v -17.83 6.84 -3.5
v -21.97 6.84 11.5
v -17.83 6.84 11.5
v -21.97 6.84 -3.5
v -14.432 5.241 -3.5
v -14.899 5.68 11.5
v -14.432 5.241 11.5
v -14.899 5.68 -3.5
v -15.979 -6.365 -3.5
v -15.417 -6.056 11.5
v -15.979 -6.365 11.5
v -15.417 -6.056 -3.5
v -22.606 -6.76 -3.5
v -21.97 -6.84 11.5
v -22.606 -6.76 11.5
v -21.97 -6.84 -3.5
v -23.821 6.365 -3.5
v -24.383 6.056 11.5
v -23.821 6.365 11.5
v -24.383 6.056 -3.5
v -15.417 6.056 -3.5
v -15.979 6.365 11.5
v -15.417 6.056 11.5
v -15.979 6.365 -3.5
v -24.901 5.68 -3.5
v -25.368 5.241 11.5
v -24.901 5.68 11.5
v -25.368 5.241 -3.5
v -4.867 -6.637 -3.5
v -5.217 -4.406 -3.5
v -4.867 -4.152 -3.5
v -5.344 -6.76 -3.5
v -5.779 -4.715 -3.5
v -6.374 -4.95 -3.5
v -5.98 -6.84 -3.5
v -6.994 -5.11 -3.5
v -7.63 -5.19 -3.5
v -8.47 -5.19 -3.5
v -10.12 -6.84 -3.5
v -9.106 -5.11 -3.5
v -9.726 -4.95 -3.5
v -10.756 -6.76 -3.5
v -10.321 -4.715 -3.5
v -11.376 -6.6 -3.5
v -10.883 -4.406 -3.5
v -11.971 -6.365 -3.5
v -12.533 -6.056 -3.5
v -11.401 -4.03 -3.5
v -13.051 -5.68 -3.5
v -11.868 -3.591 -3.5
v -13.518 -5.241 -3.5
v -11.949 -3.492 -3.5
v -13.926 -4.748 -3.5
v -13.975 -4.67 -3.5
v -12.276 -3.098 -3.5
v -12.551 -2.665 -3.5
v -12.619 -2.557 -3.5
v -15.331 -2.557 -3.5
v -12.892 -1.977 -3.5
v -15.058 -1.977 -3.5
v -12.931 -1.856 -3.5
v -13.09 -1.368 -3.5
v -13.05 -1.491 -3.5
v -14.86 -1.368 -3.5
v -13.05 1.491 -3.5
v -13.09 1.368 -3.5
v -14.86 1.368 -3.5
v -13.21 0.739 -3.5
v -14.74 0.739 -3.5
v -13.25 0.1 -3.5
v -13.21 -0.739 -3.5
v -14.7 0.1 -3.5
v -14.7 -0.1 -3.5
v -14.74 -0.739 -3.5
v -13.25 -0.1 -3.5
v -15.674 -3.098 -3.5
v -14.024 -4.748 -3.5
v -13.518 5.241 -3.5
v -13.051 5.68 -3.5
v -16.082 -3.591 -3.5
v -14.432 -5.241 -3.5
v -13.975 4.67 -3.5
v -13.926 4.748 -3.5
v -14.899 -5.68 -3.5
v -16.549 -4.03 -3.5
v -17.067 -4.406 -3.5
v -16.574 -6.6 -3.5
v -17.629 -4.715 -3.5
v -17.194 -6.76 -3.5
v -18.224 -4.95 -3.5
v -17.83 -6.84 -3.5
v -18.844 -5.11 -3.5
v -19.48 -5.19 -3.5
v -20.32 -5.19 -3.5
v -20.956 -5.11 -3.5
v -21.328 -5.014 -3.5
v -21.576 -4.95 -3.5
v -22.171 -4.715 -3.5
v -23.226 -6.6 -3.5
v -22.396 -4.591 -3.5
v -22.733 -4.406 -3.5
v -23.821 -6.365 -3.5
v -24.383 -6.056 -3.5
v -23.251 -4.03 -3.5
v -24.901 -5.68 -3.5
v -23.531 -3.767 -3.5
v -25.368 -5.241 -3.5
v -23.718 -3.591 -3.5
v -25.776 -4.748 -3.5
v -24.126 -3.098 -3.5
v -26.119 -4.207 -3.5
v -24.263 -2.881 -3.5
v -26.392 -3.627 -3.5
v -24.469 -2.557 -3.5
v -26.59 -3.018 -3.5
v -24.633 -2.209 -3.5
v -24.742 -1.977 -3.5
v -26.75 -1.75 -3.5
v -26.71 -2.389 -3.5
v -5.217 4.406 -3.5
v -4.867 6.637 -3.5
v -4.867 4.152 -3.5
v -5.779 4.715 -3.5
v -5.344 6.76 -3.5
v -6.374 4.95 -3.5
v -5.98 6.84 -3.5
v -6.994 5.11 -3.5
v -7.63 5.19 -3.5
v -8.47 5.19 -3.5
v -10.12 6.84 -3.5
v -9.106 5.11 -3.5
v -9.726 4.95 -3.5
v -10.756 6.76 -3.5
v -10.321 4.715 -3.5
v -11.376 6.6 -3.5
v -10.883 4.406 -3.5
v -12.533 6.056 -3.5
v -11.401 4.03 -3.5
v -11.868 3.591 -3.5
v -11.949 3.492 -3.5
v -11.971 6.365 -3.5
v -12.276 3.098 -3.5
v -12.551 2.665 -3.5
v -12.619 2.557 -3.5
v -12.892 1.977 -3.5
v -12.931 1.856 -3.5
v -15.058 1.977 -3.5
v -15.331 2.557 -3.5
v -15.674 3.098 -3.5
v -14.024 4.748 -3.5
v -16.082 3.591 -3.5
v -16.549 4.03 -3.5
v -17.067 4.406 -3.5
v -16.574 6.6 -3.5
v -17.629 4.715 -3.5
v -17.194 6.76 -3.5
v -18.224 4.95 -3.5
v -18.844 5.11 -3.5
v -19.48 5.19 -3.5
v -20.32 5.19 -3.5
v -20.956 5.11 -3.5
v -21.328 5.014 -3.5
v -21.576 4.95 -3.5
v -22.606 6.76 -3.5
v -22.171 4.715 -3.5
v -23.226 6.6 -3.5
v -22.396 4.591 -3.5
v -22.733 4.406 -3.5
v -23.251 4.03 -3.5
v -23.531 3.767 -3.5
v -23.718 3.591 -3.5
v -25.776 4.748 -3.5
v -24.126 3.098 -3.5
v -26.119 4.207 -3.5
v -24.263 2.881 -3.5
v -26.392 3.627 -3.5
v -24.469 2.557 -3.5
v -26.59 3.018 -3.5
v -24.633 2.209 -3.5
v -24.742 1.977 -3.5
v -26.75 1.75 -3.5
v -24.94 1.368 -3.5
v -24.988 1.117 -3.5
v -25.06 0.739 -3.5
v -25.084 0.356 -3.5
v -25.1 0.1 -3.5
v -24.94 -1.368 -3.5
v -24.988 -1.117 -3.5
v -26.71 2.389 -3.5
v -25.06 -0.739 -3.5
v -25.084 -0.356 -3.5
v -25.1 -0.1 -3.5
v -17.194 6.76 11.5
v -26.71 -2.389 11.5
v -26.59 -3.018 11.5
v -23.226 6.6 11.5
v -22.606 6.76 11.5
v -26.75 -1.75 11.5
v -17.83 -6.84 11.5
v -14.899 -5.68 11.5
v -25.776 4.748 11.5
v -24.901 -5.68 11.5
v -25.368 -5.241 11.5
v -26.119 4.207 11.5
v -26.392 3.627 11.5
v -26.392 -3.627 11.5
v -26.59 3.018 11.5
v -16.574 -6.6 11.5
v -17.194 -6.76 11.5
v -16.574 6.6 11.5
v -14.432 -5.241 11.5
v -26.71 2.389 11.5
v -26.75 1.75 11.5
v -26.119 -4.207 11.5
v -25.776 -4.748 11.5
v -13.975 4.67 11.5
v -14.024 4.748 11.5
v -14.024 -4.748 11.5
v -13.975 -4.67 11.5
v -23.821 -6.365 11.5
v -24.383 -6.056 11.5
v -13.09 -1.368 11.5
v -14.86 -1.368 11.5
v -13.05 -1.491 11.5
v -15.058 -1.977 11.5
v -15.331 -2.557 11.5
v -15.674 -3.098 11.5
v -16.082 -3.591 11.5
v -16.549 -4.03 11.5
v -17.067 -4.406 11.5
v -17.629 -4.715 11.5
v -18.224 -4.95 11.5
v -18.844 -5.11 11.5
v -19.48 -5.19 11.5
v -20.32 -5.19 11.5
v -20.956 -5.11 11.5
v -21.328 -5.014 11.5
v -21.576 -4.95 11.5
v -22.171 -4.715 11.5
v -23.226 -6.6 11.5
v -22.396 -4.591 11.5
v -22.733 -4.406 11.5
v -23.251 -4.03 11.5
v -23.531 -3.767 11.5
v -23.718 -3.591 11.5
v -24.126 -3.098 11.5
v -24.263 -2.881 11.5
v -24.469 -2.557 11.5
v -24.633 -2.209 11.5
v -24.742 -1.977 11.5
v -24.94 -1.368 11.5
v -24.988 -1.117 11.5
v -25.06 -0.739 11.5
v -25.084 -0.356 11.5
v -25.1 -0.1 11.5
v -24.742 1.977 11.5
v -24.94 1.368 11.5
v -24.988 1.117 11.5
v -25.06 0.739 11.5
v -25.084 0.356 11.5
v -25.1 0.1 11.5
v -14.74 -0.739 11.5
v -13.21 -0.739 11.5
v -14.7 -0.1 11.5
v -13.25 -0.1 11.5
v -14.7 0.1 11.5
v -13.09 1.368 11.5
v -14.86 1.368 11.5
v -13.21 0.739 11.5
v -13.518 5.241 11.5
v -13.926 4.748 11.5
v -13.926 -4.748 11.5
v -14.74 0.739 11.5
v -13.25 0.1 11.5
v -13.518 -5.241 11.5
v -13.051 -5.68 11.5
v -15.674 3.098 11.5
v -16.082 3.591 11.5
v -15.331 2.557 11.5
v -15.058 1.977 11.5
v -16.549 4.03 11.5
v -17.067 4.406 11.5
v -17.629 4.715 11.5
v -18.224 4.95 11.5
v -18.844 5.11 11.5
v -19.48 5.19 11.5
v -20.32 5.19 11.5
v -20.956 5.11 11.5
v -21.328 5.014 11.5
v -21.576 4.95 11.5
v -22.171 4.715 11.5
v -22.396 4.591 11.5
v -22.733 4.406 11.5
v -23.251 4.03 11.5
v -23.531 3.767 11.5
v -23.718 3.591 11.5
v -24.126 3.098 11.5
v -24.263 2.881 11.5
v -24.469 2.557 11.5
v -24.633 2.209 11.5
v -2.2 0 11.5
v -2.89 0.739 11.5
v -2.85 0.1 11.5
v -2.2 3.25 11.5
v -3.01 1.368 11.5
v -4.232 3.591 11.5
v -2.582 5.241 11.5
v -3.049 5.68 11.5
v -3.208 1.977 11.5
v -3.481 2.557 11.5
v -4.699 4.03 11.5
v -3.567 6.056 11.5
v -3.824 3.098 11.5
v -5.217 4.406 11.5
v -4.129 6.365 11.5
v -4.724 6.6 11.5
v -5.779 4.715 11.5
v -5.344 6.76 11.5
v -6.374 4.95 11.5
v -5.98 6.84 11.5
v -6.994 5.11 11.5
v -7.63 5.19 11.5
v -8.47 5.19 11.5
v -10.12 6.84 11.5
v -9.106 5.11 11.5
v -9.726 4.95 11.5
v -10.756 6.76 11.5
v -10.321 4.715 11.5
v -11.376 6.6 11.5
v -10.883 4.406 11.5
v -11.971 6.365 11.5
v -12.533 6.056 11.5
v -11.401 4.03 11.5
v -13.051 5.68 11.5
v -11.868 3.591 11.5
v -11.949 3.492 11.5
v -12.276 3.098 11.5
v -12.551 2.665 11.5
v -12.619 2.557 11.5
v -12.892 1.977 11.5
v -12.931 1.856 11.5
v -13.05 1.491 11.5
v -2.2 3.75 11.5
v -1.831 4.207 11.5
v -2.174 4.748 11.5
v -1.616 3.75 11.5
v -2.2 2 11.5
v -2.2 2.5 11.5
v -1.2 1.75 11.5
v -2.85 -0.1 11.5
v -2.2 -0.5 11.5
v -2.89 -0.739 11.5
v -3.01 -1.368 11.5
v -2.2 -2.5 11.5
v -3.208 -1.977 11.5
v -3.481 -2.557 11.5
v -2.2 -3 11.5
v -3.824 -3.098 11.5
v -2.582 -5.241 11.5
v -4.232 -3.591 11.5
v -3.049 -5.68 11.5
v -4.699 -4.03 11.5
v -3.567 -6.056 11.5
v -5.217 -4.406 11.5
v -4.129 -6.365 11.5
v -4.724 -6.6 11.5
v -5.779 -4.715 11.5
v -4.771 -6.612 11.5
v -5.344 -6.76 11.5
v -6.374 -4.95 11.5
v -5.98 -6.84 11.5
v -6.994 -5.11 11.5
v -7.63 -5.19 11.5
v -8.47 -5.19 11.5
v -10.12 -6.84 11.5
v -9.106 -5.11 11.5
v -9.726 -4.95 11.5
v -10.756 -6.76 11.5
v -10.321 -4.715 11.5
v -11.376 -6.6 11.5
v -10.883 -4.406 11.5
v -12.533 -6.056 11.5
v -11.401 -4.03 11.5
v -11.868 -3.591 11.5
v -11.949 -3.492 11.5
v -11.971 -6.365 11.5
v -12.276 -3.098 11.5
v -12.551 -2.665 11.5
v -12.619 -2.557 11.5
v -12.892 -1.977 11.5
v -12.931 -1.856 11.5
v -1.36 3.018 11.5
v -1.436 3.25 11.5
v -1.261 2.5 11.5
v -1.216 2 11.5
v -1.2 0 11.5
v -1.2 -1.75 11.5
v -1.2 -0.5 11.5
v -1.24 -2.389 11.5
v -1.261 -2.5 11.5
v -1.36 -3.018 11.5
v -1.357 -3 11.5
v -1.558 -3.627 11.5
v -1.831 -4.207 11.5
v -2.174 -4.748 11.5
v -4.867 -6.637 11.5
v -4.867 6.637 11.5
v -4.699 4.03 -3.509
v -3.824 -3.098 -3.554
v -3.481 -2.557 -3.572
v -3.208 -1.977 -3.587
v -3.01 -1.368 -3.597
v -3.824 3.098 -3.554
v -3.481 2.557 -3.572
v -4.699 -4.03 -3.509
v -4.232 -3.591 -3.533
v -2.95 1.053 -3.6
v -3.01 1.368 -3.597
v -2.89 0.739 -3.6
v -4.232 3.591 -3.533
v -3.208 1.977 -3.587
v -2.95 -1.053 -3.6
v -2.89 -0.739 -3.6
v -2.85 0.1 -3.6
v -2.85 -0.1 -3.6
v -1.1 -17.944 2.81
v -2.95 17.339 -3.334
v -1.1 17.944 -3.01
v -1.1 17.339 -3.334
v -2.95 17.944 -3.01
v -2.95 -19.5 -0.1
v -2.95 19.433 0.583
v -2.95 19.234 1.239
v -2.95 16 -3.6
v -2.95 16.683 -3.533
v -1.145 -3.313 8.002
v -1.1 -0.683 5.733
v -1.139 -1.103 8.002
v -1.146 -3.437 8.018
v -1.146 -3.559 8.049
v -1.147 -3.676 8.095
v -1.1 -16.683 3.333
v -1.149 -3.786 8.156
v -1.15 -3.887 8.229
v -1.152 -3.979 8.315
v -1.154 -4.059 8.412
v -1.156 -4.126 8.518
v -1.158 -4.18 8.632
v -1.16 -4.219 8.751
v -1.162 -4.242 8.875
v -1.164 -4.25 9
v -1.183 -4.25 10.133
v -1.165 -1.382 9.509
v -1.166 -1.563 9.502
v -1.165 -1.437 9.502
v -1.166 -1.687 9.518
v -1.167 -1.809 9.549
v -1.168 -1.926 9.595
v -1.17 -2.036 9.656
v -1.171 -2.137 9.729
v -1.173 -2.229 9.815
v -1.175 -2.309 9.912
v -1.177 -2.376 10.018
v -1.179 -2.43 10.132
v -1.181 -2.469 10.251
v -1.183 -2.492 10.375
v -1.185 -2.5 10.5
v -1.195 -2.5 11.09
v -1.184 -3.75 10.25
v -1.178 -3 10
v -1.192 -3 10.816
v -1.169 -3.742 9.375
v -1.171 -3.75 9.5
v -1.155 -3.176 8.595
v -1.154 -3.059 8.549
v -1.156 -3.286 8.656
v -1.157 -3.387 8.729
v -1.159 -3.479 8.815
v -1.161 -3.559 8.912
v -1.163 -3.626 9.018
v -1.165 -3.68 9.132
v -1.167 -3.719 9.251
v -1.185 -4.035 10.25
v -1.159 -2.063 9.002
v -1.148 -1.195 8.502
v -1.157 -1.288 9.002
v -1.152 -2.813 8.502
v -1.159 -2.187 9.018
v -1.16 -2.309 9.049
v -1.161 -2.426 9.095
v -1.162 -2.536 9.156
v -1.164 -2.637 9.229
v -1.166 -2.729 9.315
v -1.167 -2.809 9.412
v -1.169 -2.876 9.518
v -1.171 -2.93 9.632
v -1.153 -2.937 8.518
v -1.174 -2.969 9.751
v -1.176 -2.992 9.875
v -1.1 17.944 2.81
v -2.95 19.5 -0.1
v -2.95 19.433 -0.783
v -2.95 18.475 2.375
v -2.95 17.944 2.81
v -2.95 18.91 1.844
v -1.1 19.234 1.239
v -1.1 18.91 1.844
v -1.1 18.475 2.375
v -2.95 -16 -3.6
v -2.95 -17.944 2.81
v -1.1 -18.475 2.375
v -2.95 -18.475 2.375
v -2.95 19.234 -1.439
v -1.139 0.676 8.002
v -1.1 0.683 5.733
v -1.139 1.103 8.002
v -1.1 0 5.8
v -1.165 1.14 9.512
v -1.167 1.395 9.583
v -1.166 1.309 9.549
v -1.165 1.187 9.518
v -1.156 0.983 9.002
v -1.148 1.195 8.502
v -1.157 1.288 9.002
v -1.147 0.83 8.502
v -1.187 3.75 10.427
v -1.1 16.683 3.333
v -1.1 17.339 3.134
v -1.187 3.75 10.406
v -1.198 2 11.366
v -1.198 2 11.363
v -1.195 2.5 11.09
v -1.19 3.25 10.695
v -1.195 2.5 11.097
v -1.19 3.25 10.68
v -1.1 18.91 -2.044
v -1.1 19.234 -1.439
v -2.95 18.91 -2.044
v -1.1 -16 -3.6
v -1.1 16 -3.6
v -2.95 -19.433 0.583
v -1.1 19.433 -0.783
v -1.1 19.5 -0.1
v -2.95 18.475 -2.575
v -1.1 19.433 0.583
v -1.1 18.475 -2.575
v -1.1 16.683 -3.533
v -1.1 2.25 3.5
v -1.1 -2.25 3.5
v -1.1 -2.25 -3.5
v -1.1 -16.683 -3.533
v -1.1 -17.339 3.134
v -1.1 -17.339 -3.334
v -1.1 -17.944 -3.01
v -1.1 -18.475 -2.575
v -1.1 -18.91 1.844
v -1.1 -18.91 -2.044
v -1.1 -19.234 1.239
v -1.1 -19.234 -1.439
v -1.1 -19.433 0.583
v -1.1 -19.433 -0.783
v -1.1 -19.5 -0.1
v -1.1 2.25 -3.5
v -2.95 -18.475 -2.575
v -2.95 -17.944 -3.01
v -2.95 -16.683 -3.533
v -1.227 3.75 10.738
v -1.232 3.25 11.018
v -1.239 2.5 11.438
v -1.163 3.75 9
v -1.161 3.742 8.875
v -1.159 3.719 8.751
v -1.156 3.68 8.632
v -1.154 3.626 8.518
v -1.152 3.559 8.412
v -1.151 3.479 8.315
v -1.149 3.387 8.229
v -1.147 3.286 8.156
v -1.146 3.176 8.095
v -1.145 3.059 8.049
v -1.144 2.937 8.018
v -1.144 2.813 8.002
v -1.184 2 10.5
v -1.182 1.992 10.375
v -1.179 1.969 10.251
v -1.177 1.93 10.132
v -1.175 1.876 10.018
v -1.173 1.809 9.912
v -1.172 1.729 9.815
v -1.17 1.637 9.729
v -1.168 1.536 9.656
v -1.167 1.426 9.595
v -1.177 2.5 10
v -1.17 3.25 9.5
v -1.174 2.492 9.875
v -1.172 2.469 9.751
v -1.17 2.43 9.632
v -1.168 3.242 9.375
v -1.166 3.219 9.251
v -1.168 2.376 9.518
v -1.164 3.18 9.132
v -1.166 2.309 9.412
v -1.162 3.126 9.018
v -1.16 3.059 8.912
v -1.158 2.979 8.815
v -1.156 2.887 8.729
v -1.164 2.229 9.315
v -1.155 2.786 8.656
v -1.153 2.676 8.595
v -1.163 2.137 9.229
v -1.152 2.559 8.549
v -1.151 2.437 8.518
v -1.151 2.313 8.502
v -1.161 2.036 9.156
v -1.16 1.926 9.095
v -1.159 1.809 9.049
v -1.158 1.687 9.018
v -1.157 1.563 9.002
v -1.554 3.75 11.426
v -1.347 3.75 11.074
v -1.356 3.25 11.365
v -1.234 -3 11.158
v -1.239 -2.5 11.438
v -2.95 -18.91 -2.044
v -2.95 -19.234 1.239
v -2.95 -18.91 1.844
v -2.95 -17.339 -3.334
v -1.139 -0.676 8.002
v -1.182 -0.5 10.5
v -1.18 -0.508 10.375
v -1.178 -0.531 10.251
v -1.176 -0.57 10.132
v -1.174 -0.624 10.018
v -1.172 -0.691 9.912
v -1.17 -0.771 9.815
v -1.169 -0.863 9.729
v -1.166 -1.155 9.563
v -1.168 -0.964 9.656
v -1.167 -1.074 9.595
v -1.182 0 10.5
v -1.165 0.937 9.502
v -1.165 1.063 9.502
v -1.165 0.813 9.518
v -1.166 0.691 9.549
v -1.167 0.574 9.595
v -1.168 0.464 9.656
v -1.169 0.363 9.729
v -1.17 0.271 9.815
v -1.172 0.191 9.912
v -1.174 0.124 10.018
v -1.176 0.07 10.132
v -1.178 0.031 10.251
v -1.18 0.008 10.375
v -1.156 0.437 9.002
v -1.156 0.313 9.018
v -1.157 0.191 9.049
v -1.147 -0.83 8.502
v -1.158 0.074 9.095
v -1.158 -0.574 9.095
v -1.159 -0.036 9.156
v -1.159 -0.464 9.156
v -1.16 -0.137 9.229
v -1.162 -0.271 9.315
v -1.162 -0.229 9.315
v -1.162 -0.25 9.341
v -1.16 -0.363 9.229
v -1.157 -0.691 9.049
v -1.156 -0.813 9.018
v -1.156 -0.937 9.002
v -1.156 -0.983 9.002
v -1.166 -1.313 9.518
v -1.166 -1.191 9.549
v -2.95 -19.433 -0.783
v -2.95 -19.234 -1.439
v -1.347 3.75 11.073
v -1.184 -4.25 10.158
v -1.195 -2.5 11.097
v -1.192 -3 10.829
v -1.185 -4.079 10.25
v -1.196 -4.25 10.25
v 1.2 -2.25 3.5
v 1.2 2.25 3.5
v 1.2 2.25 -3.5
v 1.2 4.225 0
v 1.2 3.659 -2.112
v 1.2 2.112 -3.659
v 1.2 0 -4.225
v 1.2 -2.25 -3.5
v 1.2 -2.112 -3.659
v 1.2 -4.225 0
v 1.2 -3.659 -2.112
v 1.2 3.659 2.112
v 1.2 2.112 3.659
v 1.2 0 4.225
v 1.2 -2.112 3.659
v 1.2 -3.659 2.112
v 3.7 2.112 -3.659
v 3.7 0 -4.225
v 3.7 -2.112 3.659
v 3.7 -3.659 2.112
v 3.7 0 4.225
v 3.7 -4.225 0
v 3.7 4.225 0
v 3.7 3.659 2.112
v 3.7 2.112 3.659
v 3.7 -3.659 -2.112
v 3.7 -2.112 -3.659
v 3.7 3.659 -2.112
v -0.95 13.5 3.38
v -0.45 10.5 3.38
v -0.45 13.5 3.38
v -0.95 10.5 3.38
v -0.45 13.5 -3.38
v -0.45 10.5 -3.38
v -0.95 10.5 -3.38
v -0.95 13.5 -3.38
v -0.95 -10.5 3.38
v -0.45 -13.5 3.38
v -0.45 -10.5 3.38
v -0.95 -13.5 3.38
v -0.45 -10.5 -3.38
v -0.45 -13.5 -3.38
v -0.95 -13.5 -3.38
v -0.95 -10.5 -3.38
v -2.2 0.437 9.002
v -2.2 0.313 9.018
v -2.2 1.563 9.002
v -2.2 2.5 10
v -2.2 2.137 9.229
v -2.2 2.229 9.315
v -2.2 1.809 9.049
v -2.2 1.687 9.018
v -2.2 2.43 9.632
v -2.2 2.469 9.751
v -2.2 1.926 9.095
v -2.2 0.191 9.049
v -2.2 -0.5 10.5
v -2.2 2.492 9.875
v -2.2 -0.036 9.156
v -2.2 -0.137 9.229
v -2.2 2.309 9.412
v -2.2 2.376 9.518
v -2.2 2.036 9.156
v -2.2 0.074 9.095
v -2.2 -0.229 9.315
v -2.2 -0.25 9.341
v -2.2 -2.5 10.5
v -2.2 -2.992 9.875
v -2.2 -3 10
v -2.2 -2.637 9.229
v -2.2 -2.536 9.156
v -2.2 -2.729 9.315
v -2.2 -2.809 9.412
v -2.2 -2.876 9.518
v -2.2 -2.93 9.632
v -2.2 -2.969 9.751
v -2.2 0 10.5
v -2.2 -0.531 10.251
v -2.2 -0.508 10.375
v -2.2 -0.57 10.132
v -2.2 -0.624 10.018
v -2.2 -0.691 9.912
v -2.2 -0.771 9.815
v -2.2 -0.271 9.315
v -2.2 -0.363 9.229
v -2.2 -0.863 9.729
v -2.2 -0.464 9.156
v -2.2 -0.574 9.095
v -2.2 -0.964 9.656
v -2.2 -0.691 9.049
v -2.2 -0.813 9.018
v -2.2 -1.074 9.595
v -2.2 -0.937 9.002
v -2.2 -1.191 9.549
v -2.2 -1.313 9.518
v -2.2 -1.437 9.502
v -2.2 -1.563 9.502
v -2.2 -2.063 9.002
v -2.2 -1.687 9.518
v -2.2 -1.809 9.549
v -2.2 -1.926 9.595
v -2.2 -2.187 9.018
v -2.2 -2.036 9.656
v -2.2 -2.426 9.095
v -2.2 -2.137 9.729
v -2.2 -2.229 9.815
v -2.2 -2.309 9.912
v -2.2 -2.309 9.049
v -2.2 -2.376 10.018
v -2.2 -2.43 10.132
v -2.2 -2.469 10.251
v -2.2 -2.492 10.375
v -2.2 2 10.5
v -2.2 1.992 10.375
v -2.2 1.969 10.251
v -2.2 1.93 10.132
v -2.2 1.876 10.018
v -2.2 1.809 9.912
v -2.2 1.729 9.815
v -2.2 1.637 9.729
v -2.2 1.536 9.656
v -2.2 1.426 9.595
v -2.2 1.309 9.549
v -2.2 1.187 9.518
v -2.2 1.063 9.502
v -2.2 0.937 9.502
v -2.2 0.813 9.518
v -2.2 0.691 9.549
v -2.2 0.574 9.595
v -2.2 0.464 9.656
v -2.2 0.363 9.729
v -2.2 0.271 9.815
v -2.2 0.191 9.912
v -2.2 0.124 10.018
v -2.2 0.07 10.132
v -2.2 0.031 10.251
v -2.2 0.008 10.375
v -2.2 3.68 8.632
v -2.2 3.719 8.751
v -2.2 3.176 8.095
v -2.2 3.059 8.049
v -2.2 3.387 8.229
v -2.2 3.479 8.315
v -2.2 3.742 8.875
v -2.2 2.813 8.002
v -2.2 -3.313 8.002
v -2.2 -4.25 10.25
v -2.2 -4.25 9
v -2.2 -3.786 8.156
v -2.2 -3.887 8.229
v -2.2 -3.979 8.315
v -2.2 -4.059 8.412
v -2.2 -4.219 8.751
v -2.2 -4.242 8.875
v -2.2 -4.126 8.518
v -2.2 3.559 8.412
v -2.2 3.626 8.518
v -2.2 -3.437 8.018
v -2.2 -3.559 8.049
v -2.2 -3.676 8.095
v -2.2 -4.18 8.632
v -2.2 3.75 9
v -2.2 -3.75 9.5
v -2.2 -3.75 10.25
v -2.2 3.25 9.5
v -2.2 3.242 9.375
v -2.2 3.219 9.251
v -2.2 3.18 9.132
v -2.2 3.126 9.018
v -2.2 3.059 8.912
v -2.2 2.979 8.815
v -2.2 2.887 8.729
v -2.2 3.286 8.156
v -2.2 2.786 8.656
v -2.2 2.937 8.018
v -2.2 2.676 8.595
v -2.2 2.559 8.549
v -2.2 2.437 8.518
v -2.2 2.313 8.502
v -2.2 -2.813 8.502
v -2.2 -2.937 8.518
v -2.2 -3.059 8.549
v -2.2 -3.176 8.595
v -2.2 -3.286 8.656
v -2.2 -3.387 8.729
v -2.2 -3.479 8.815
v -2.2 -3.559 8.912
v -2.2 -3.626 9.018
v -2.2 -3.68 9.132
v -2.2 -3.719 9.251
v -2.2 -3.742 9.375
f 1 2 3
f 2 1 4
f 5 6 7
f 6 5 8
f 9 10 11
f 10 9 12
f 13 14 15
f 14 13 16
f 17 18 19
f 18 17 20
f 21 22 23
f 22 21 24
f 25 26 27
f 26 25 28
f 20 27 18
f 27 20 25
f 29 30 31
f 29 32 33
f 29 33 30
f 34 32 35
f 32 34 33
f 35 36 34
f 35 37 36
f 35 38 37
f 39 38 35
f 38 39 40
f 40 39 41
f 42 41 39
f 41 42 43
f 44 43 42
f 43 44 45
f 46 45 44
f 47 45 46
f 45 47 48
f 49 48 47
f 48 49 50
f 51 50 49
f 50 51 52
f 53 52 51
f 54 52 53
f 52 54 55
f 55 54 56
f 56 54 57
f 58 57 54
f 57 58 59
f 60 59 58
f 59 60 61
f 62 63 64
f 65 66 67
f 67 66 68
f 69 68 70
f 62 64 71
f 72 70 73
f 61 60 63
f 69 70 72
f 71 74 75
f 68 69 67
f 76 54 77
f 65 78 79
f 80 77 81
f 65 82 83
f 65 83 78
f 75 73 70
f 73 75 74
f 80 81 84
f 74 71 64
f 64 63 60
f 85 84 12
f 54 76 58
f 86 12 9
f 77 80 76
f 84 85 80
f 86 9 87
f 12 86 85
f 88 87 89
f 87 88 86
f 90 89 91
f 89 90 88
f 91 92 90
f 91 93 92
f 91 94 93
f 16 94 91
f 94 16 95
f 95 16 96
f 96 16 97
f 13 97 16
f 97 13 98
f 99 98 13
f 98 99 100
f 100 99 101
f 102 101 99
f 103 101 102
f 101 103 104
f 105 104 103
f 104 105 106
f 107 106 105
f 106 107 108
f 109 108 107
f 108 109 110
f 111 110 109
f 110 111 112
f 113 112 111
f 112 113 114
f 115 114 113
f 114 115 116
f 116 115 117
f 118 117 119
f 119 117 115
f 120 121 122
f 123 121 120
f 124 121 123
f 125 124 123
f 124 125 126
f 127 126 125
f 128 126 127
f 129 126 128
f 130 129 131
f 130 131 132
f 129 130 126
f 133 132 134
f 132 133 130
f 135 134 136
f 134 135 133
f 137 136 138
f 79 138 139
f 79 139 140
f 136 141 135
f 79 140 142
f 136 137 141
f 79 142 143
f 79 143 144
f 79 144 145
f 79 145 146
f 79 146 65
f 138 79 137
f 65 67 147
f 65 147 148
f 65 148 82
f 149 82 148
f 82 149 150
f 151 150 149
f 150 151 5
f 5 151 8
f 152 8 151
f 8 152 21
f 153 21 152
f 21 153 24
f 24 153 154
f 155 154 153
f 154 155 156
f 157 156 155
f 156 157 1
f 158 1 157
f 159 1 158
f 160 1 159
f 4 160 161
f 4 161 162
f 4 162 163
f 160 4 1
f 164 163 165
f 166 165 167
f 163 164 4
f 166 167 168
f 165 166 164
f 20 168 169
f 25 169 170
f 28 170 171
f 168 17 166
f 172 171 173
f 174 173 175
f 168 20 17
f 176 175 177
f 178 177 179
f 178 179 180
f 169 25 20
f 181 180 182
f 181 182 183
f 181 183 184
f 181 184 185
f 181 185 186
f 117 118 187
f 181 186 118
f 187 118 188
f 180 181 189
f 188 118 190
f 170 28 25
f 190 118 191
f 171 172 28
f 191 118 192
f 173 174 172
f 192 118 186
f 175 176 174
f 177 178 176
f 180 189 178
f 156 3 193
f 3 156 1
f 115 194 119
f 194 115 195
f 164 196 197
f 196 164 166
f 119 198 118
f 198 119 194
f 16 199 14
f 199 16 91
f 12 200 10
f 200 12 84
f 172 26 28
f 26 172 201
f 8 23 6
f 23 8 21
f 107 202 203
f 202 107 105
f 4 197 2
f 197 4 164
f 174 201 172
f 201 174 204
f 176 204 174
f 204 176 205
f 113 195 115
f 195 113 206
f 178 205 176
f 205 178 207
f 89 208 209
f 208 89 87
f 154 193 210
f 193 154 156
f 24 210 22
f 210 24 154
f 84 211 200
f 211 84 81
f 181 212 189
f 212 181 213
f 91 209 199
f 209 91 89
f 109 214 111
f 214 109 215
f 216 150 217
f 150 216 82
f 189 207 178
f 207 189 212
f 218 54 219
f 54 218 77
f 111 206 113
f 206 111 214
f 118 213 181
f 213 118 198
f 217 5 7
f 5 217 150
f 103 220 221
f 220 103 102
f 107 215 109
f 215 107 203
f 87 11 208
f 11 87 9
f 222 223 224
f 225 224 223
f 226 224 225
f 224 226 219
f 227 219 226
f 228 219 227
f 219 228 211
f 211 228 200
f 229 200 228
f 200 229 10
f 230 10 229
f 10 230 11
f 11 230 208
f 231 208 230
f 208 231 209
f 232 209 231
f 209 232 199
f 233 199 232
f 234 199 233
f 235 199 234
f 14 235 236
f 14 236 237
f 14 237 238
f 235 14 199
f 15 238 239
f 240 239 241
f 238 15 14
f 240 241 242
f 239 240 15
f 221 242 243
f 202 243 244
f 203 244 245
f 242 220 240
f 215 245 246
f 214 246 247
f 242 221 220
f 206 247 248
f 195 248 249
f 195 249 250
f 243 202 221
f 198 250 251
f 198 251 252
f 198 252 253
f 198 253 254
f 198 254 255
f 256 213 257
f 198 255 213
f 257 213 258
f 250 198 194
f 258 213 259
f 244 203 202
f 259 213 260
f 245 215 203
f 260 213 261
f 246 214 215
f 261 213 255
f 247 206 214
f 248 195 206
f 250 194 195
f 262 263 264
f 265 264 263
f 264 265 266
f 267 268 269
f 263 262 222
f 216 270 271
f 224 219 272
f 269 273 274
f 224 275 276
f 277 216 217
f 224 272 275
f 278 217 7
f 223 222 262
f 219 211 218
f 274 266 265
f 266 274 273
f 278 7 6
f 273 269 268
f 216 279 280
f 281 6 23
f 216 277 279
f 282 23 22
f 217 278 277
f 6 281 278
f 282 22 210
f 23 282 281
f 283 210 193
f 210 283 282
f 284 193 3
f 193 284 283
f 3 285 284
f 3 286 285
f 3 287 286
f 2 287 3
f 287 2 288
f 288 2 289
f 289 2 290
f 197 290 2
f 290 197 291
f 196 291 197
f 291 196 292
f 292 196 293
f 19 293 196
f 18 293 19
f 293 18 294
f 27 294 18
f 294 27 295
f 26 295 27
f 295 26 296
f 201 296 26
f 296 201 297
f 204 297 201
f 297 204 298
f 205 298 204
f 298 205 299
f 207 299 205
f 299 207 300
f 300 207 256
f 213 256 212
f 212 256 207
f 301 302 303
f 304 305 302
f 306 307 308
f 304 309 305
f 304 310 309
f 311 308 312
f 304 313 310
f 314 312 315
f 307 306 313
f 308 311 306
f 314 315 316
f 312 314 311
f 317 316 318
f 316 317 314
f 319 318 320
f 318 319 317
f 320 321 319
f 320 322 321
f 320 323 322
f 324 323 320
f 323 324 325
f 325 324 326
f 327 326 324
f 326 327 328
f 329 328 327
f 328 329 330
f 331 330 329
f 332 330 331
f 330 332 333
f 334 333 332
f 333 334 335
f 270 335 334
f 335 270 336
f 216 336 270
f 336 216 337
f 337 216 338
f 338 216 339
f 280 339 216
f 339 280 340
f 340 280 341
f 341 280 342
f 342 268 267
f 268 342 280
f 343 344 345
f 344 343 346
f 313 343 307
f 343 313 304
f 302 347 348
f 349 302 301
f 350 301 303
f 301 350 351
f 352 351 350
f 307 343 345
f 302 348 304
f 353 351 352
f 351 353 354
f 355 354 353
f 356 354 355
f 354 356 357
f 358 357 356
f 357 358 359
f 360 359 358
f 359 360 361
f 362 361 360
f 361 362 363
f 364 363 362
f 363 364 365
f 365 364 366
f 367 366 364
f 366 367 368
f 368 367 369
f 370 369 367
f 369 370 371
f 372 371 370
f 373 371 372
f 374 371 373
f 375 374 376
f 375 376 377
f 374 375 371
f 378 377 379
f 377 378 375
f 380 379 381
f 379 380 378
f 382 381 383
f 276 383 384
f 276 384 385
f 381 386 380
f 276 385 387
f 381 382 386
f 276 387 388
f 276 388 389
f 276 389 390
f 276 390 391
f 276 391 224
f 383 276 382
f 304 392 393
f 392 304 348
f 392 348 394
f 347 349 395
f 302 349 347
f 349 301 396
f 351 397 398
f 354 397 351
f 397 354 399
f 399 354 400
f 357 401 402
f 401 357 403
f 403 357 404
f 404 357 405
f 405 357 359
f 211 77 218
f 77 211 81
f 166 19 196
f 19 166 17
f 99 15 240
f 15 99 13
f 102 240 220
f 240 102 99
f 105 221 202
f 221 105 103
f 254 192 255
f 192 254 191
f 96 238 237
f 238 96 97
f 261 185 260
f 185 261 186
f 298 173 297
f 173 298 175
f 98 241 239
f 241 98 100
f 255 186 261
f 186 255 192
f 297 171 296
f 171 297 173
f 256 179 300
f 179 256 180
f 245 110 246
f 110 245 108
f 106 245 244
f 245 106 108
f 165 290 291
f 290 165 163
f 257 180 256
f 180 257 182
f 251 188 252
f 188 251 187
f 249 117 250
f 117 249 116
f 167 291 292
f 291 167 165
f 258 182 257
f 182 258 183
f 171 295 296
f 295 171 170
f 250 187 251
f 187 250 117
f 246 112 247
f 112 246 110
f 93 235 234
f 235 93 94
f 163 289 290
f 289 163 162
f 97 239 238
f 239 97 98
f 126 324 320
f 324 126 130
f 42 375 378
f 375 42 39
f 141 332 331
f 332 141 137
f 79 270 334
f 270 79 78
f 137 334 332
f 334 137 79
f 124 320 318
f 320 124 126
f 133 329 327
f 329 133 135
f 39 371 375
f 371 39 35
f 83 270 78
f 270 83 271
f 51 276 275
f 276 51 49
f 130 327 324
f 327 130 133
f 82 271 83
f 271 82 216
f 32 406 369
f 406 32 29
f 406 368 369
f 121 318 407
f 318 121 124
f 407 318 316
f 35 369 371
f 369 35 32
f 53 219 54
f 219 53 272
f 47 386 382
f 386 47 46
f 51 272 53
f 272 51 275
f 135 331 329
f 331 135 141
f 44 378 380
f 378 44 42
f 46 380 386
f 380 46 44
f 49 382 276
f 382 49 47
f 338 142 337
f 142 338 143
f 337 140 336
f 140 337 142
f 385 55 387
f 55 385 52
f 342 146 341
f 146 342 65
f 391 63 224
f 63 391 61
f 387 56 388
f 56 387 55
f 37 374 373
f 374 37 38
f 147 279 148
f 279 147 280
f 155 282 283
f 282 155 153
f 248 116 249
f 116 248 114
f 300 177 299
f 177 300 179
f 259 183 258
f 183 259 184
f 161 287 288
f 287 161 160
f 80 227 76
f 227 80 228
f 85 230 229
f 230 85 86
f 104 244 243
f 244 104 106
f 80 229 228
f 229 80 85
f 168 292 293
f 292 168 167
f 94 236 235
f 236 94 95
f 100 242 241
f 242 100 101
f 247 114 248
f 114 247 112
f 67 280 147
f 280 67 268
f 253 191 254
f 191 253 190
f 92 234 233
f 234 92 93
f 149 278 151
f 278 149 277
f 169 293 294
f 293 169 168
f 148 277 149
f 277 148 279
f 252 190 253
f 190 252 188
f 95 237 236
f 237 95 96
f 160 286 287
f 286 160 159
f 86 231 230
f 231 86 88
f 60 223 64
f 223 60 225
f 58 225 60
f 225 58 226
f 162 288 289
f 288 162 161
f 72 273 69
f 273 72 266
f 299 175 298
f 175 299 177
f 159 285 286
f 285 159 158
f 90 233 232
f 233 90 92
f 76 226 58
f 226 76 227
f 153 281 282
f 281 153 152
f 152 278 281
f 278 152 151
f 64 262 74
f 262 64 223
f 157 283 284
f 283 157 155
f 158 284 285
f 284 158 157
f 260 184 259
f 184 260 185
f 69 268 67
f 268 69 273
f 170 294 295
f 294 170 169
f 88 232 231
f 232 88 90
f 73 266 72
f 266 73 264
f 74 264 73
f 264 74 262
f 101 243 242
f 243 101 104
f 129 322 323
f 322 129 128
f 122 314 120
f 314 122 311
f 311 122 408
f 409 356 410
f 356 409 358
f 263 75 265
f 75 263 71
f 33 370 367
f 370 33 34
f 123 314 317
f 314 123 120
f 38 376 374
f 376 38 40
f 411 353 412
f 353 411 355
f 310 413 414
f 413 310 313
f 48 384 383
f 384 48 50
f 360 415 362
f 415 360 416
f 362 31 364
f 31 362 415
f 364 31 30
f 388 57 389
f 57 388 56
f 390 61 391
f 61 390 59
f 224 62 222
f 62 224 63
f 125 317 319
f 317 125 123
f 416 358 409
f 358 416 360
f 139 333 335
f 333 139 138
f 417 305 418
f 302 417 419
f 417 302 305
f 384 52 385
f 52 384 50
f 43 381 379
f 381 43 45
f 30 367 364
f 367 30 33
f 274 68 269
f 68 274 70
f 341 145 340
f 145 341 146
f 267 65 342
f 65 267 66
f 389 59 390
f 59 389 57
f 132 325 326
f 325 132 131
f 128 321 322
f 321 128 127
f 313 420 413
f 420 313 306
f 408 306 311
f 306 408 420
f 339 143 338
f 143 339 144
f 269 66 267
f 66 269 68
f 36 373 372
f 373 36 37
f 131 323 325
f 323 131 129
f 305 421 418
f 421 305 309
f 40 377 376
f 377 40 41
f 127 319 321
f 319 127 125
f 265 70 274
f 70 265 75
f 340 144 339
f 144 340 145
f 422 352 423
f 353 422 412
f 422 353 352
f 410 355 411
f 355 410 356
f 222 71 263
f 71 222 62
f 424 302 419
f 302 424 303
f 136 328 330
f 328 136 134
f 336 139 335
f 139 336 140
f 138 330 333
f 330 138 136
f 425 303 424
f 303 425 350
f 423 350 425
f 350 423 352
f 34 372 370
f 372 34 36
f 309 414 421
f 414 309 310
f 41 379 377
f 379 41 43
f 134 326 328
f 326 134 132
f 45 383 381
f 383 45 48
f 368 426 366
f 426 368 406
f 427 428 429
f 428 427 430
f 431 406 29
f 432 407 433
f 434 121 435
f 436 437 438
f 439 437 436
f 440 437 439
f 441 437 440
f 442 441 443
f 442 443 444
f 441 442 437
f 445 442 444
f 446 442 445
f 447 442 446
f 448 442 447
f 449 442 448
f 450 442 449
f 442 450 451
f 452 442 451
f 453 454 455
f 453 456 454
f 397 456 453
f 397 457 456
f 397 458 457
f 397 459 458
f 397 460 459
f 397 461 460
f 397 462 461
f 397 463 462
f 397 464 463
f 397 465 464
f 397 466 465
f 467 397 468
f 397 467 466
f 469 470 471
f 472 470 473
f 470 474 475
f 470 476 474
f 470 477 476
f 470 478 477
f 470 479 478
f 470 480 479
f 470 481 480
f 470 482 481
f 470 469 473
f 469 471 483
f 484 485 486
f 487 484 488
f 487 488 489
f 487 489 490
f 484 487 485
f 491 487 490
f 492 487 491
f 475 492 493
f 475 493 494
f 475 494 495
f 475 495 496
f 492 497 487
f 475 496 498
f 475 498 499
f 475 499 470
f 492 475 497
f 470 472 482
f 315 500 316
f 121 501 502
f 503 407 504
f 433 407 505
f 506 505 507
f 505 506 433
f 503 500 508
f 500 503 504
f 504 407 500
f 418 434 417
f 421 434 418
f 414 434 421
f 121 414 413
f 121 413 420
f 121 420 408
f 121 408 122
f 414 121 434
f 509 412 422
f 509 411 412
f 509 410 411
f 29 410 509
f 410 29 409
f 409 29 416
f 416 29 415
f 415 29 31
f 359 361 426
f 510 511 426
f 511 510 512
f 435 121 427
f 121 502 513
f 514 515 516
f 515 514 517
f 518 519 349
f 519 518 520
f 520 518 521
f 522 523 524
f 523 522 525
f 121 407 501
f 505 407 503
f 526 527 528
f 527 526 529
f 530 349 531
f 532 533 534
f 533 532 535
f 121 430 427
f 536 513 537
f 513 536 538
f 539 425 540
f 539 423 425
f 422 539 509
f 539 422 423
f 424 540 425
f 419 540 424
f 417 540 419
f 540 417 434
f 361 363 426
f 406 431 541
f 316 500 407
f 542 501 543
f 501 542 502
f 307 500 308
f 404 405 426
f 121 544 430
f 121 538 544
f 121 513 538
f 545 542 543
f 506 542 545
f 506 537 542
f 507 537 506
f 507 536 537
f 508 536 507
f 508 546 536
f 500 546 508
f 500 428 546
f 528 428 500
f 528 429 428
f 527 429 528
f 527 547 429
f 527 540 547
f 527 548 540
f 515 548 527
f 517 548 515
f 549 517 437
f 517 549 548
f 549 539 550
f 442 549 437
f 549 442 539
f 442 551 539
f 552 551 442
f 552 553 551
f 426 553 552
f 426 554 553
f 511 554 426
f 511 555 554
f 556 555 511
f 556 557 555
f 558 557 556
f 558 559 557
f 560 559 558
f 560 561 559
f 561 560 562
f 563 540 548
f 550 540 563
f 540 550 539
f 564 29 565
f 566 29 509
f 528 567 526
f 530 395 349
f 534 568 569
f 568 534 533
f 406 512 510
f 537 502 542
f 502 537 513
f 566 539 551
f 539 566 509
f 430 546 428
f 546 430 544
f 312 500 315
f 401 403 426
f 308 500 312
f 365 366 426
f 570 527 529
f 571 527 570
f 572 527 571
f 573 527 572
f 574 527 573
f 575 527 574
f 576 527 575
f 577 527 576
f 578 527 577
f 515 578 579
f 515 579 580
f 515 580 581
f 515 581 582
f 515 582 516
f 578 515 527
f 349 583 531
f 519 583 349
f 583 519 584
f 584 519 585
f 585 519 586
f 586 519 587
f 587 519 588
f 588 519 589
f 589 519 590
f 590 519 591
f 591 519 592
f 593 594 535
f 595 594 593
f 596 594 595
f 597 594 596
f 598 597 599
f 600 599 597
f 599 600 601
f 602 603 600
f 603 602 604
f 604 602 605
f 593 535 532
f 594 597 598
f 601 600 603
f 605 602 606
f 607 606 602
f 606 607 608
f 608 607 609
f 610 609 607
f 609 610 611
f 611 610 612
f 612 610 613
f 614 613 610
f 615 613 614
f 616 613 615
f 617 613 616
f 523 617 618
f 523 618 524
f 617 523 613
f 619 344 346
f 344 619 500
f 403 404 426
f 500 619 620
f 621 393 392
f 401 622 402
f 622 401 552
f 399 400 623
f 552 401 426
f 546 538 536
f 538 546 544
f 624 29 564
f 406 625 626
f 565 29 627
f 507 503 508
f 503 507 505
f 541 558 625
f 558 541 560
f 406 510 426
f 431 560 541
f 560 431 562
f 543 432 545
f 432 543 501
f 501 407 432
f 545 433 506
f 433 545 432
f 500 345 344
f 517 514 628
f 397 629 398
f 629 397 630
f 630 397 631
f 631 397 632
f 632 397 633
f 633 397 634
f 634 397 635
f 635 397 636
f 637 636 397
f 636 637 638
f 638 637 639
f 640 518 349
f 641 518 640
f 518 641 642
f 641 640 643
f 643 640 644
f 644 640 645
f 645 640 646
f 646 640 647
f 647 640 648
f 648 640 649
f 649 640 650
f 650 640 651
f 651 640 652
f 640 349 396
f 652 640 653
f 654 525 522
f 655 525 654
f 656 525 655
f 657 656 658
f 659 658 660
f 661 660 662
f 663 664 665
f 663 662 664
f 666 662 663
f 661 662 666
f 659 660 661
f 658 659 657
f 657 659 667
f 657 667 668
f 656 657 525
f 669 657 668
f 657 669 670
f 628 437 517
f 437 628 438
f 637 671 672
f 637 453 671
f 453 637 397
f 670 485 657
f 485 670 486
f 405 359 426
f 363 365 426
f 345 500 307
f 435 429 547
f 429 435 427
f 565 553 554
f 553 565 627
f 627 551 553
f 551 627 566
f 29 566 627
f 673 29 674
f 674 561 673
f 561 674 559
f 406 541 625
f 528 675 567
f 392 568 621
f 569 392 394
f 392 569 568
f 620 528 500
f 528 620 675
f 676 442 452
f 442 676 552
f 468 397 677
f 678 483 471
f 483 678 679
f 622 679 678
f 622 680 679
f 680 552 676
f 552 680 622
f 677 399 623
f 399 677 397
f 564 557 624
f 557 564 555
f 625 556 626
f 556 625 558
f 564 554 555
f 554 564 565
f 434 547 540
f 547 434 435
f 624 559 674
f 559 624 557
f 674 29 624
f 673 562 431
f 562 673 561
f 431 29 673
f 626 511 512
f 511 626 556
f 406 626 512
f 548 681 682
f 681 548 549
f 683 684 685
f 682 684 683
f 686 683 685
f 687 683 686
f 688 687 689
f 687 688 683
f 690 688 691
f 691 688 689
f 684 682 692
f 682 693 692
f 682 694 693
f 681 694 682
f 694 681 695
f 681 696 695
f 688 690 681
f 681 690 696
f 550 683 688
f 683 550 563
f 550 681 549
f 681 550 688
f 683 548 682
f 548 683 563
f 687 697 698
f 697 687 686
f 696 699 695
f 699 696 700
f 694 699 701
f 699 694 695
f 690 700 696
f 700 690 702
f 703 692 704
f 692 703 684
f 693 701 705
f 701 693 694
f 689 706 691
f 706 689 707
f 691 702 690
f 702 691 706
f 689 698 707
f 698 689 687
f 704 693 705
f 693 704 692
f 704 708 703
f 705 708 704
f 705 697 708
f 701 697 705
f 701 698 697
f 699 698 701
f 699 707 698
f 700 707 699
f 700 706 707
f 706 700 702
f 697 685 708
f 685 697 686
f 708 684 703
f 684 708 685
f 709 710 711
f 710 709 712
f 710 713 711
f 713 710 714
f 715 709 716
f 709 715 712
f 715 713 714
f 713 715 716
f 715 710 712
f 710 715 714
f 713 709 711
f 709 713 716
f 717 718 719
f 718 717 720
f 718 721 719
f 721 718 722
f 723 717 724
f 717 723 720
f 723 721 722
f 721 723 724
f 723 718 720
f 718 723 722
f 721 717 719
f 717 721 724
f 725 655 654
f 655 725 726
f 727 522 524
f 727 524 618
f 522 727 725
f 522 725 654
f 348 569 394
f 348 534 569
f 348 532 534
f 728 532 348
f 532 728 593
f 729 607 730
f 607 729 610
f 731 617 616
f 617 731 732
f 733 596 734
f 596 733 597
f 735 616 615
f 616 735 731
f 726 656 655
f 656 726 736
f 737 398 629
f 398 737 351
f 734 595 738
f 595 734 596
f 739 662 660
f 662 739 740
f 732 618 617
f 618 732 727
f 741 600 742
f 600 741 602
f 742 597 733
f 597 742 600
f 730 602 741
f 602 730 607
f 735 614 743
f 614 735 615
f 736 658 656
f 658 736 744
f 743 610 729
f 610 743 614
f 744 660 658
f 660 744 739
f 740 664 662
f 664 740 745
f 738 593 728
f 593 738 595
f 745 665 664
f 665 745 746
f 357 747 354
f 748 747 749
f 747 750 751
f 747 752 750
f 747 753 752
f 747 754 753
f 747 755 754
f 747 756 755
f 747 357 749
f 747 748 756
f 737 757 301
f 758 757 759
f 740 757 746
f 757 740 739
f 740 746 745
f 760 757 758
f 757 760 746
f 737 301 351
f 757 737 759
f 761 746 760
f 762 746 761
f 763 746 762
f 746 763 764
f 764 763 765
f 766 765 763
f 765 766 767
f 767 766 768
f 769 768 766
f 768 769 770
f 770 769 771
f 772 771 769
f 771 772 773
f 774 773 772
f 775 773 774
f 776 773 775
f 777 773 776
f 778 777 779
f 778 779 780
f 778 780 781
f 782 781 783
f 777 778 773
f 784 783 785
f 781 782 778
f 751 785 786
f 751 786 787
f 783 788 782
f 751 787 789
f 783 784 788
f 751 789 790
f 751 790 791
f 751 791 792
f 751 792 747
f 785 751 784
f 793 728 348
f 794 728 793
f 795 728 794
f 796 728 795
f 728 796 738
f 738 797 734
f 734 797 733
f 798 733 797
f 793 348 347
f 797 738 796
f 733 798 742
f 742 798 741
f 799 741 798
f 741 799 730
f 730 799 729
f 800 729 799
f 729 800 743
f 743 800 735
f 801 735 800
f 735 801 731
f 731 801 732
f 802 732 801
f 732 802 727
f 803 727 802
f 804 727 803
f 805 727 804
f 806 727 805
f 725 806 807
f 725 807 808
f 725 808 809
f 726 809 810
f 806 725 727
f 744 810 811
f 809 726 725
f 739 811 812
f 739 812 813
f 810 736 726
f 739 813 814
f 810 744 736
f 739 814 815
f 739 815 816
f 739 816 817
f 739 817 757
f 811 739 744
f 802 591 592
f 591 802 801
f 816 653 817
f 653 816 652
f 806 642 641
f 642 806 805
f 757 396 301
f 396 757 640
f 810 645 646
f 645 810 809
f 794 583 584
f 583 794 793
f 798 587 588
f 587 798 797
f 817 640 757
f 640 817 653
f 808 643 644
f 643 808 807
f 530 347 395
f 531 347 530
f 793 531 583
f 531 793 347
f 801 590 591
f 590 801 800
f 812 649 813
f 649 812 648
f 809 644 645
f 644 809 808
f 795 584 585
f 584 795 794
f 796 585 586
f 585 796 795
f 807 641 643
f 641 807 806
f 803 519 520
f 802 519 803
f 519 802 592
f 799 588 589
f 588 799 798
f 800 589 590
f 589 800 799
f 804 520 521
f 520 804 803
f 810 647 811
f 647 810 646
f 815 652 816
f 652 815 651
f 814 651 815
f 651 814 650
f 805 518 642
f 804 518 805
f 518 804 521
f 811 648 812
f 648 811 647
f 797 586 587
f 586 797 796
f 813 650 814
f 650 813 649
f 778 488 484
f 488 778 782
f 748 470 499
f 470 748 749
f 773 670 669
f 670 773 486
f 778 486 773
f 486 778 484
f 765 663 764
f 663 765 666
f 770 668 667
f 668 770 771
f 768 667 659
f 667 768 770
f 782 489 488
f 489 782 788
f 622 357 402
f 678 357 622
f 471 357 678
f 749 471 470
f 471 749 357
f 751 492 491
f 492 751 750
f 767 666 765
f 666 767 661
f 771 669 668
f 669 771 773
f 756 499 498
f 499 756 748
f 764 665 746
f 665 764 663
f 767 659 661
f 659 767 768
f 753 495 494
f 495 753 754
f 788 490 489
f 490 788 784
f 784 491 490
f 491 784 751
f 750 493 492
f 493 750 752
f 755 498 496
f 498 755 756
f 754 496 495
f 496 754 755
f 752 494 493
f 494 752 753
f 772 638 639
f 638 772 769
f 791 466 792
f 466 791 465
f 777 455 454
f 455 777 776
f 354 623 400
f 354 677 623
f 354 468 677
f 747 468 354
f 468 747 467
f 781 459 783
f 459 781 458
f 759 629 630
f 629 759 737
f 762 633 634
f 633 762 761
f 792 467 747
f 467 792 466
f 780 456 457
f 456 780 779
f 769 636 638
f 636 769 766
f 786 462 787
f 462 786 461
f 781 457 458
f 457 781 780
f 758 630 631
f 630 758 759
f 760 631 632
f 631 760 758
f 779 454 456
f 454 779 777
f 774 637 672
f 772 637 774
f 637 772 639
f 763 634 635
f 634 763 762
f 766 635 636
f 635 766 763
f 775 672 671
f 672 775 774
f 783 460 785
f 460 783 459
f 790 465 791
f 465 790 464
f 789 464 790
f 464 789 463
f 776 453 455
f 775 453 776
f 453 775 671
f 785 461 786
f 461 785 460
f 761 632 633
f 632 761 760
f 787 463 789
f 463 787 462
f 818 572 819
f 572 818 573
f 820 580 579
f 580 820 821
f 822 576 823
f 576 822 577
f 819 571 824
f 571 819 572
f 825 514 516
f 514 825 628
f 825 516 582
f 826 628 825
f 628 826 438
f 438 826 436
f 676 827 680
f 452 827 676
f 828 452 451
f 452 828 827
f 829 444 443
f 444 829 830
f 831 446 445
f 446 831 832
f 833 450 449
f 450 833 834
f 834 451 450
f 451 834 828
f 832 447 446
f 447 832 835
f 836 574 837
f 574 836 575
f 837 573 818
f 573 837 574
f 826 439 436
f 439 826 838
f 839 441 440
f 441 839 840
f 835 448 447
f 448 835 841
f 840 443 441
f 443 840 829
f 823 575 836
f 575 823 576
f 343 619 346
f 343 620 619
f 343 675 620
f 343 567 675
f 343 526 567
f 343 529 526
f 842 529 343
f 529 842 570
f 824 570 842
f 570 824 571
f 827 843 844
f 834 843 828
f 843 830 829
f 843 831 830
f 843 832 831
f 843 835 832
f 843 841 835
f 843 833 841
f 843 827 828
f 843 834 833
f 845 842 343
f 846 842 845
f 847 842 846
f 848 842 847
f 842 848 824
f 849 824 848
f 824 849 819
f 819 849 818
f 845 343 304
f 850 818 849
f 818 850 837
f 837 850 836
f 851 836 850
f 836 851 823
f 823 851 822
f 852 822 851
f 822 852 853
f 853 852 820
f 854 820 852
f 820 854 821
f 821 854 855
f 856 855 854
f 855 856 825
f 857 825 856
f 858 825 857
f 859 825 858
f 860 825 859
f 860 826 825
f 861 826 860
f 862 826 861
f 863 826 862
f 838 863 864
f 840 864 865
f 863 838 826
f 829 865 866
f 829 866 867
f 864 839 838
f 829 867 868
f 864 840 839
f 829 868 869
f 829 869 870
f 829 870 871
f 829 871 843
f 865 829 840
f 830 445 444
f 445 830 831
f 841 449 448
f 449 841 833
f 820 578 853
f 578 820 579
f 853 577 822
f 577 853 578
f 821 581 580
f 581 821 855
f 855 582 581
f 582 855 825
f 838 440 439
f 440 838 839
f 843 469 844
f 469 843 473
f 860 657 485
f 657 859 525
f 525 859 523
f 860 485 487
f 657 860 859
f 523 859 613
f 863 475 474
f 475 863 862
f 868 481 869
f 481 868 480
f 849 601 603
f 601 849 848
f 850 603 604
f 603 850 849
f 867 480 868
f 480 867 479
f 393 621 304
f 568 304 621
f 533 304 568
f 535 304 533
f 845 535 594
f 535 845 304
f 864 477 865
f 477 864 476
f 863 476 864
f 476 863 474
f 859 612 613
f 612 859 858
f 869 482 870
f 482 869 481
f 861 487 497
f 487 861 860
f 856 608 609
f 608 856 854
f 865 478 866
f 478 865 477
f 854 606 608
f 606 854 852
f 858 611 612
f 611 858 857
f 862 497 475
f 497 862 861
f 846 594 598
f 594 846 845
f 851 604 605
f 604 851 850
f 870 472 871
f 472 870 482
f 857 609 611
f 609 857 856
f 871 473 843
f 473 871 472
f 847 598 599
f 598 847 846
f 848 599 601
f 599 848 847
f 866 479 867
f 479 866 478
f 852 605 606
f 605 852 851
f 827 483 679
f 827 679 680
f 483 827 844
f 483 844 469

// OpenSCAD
// PEGSTR - Pegboard Wizard
// Design by Marius Gheorghescu, November 2014
// Update log:
// November 9th 2014
//		- first coomplete version. Angled holders are often odd/incorrect.
// November 15th 2014
//		- minor tweaks to increase rendering speed. added logo. 
// November 28th 2014
//		- bug fixes
// March 2020
//      - compa

// preview[view:north, tilt:bottom diagonal]

// width of the orifice
holder_x_size = 10;

// depth of the orifice
holder_y_size = 10;

// hight of the holder
holder_height = 15;

// how thick are the walls. Hint: 6*extrusion width produces the best results.
wall_thickness = 1.85;

// how many times to repeat the holder on X axis
holder_x_count = 1;

// how many times to repeat the holder on Y axis
holder_y_count = 2;

// orifice corner radius (roundness). Needs to be less than min(x,y)/2.
corner_radius = 30;

// Use values less than 1.0 to make the bottom of the holder narrow
taper_ratio = 1.0;


/* [Advanced] */

// offset from the peg board, typically 0 unless you have an object that needs clearance
holder_offset = 0.0;

// what ratio of the holders bottom is reinforced to the plate [0.0-1.0]
strength_factor = 0.1;

// number of horizontal rows of pins, should be 1 or more.
min_pin_z_count=1;

// for bins: what ratio of wall thickness to use for closing the bottom
closed_bottom = 0.0;

// what percentage cu cut in the front (example to slip in a cable or make the tool snap from the side)
holder_cutout_side = 0.0;

// set an angle for the holder to prevent object from sliding or to view it better from the top
holder_angle = 0.0;


/* [Hidden] */

// what is the $fn parameter
holder_sides = max(50, min(20, holder_x_size*2));

// dimensions EU Pegboard
hole_spacing_z = 24;
hole_spacing_x = 48;

hole_size_x = 7;
hole_size_y = 4.5;
board_thickness = 2.4;

// TODO check this!!!
edge_size = 8.45;
edge_thickness = 2.5;
min_width_for_single_height=32;

holder_total_y = wall_thickness + holder_y_count*(wall_thickness+holder_y_size);
holder_total_temp_x = wall_thickness + holder_x_count*(wall_thickness+holder_x_size);
holder_total_z = max(holder_height, (min_pin_z_count-1) * hole_spacing_z);
holder_roundness = min(corner_radius, holder_x_size/2, holder_y_size/2); 

pin_z_count = max(holder_height / hole_spacing_z, min_pin_z_count);

holder_total_x = pin_z_count == 1 ? max(min_width_for_single_height, holder_total_temp_x) : holder_total_temp_x;

pin_x_count = floor(holder_total_x/hole_spacing_x) + 1;


// what is the $fn parameter for holders
fn = 32;

epsilon = 0.1;

$fn = fn;

module round_rect_ex(x1, y1, x2, y2, z, r1, r2)
{
	$fn=holder_sides;
	brim = z/10;

	//rotate([0,0,(holder_sides==6)?30:((holder_sides==4)?45:0)])
	hull() {
        translate([-x1/2 + r1, y1/2 - r1, z/2-brim/2])
            cylinder(r=r1, h=brim,center=true);
        translate([x1/2 - r1, y1/2 - r1, z/2-brim/2])
            cylinder(r=r1, h=brim,center=true);
        translate([-x1/2 + r1, -y1/2 + r1, z/2-brim/2])
            cylinder(r=r1, h=brim,center=true);
        translate([x1/2 - r1, -y1/2 + r1, z/2-brim/2])
            cylinder(r=r1, h=brim,center=true);

        translate([-x2/2 + r2, y2/2 - r2, -z/2+brim/2])
            cylinder(r=r2, h=brim,center=true);
        translate([x2/2 - r2, y2/2 - r2, -z/2+brim/2])
            cylinder(r=r2, h=brim,center=true);
        translate([-x2/2 + r2, -y2/2 + r2, -z/2+brim/2])
            cylinder(r=r2, h=brim,center=true);
        translate([x2/2 - r2, -y2/2 + r2, -z/2+brim/2])
            cylinder(r=r2, h=brim,center=true);

    }
}

module pin(clipX, clipY)
{        
	if (clipX && clipY) {
        cube([hole_size_x,hole_size_y,board_thickness], center=true);
		
        intersection() {
			translate([0, 0, board_thickness / 2])
                cylinder(r=edge_size/2, h=edge_thickness, center=false, $fn=12);
        }
	} else if (clipX || clipY) {
        vertical = holder_total_z > holder_total_z;
        x = vertical ? 3 : edge_size * 0.8;
        y = vertical ? edge_size * 0.8 : 3;
        translate([0,0,-board_thickness / 2 + 0.5])
            cube([x,y,0.5], center=true);
    }
}

module pinboard_clips() 
{
	rotate([0,90,0]){        
        xTempCount = floor(holder_total_x/(hole_spacing_x / 4));
        xCount = xTempCount % 4 == 1 ? xTempCount - 1 : (xTempCount% 4 == 3 ? xTempCount - 1 : xTempCount);
        zCount = pin_z_count * 2 - 2;
        
        for(x=[0:xCount]) {
            for(z=[0:zCount]) {
                translate([
                    z * hole_spacing_z/2, 
                    -(hole_spacing_x/4) * xCount/2 + (x * hole_spacing_x/4), 
                    0])
                        pin(z % 2 == 0, (
                (x % 4 == 1 && xCount % 4 != 0) ||
                (xCount % 4 == 0 && x % 4 == 0)));
            }
        }
    }
}

module pinboard()
{
        
	rotate([0,90,0])
	translate([-epsilon, 0, -wall_thickness - board_thickness/2 + epsilon])
	hull() {
		translate([0, 
			-holder_total_x/2,0])
			cylinder(r=hole_size_x/2, h=wall_thickness);

		translate([0, 
			holder_total_x/2,0])
			cylinder(r=hole_size_x/2,  h=wall_thickness);

		translate([max(strength_factor, pin_z_count - 1)*hole_spacing_z,
			-hole_spacing_x*((pin_x_count-1)/2),0])
			cylinder(r=hole_size_x/2, h=wall_thickness);

		translate([max(strength_factor, pin_z_count - 1)*hole_spacing_z,
			hole_spacing_x*((pin_x_count-1)/2),0])
			cylinder(r=hole_size_x/2,  h=wall_thickness);

	}
}

module holder(negative)
{
    delta_x = max(0, holder_total_x-(holder_x_count * (holder_x_size + 2*wall_thickness))) / 2;
    
	for(x=[1:holder_x_count]){
		for(y=[1:holder_y_count]) 
/*		render(convexity=2)*/ {
			translate([
				-holder_total_y /*- (holder_y_size+wall_thickness)/2*/ + y*(holder_y_size+wall_thickness) + wall_thickness,

				delta_x - holder_total_x/2 + (holder_x_size+wall_thickness)/2 + (x-1)*(holder_x_size+wall_thickness) + wall_thickness/2,
				 0])			
	{
		rotate([0, holder_angle, 0])
		translate([
			-wall_thickness*abs(sin(holder_angle))-0*abs((holder_y_size/2)*sin(holder_angle))-holder_offset-(holder_y_size + 2*wall_thickness)/2 - board_thickness/2,
			0,
			-(holder_height/2)*sin(holder_angle) - holder_height/2 + hole_size_x/2
		])
		difference() {
			if (!negative)

				round_rect_ex(
					(holder_y_size + 2*wall_thickness), 
					holder_x_size + 2*wall_thickness, 
					(holder_y_size + 2*wall_thickness)*taper_ratio, 
					(holder_x_size + 2*wall_thickness)*taper_ratio, 
					holder_height, 
					holder_roundness + epsilon, 
					holder_roundness*taper_ratio + epsilon);

				translate([0,0,closed_bottom*wall_thickness])

				if (negative>1) {
					round_rect_ex(
						holder_y_size*taper_ratio, 
						holder_x_size*taper_ratio, 
						holder_y_size*taper_ratio, 
						holder_x_size*taper_ratio, 
						3*max(holder_height, hole_spacing_z),
						holder_roundness*taper_ratio + epsilon, 
						holder_roundness*taper_ratio + epsilon);
				} else {
					round_rect_ex(
						holder_y_size, 
						holder_x_size, 
						holder_y_size*taper_ratio, 
						holder_x_size*taper_ratio, 
						holder_height+2*epsilon,
						holder_roundness + epsilon, 
						holder_roundness*taper_ratio + epsilon);
				}

			if (!negative)
				if (holder_cutout_side > 0) {

				if (negative>1) {
					hull() {
						scale([1.0, holder_cutout_side, 1.0])
		 					round_rect_ex(
							holder_y_size*taper_ratio, 
							holder_x_size*taper_ratio, 
							holder_y_size*taper_ratio, 
							holder_x_size*taper_ratio, 
							3*max(holder_height, hole_spacing_z),
							holder_roundness*taper_ratio + epsilon, 
							holder_roundness*taper_ratio + epsilon);
		
						translate([0-(holder_y_size + 2*wall_thickness), 0,0])
						scale([1.0, holder_cutout_side, 1.0])
		 					round_rect_ex(
							holder_y_size*taper_ratio, 
							holder_x_size*taper_ratio, 
							holder_y_size*taper_ratio, 
							holder_x_size*taper_ratio, 
							3*max(holder_height, hole_spacing_z),
							holder_roundness*taper_ratio + epsilon, 
							holder_roundness*taper_ratio + epsilon);
					}
				} else {
					hull() {
						scale([1.0, holder_cutout_side, 1.0])
		 					round_rect_ex(
							holder_y_size, 
							holder_x_size, 
							holder_y_size*taper_ratio, 
							holder_x_size*taper_ratio, 
							holder_height+2*epsilon,
							holder_roundness + epsilon, 
							holder_roundness*taper_ratio + epsilon);
		
						translate([0-(holder_y_size + 2*wall_thickness), 0,0])
						scale([1.0, holder_cutout_side, 1.0])
		 					round_rect_ex(
							holder_y_size, 
							holder_x_size, 
							holder_y_size*taper_ratio, 
							holder_x_size*taper_ratio, 
							holder_height+2*epsilon,
							holder_roundness + epsilon, 
							holder_roundness*taper_ratio + epsilon);
						}
					}

				}
			}
		} // positioning
	} // for y
	} // for X
}


module pegstr() 
{
	difference() {
		union() {

			pinboard();


			difference() {
				hull() {
					pinboard();
	
					intersection() {
						translate([-holder_offset - (strength_factor-0.5)*holder_total_y - wall_thickness/4,0,0])
						cube([
							holder_total_y + 2*wall_thickness, 
							holder_total_x + wall_thickness, 
							2*holder_height
						], center=true);
	
						holder(0);
	
					}	
				}

				if (closed_bottom*wall_thickness < epsilon) {
						holder(2);
				}

			}

			color([0.7,0,0])
			difference() {
				holder(0);
				holder(2);
			}

			color([1,0,0])
				pinboard_clips();
		}
	
		holder(1);

		translate([-board_thickness/2,-1,-hole_size_x*2]) 
		rotate([-90,0,90]) {
			intersection() {
				union() {
					difference() {
						round_rect_ex(3, 10, 3, 10, 2, 1, 1);
						round_rect_ex(2, 9, 2, 9, 3, 1, 1);
					}
			
					translate([2.5, 0, 0]) 
						difference() {
							round_rect_ex(3, 10, 3, 10, 2, 1, 1);
							round_rect_ex(2, 9, 2, 9, 3, 1, 1);
						}
				}
			
				translate([0, -3.5, 0]) 
					cube([20,4,10], center=true);
			}
		
			translate([1.25, -2.5, 0]) 
				difference() {
					round_rect_ex(8, 7, 8, 7, 2, 1, 1);
					round_rect_ex(7, 6, 7, 6, 3, 1, 1);
		
					translate([3,0,0])
						cube([4,2.5,3], center=true);
				}
		
		
			translate([2.0, -1.0, 0]) 
				cube([8, 0.5, 2], center=true);
		
			translate([0,-2,0])
				cylinder(r=0.25, h=2, center=true, $fn=12);
		
			translate([2.5,-2,0])
				cylinder(r=0.25, h=2, center=true, $fn=12);
		}

	}
}


rotate([180,0,0]) pegstr();
